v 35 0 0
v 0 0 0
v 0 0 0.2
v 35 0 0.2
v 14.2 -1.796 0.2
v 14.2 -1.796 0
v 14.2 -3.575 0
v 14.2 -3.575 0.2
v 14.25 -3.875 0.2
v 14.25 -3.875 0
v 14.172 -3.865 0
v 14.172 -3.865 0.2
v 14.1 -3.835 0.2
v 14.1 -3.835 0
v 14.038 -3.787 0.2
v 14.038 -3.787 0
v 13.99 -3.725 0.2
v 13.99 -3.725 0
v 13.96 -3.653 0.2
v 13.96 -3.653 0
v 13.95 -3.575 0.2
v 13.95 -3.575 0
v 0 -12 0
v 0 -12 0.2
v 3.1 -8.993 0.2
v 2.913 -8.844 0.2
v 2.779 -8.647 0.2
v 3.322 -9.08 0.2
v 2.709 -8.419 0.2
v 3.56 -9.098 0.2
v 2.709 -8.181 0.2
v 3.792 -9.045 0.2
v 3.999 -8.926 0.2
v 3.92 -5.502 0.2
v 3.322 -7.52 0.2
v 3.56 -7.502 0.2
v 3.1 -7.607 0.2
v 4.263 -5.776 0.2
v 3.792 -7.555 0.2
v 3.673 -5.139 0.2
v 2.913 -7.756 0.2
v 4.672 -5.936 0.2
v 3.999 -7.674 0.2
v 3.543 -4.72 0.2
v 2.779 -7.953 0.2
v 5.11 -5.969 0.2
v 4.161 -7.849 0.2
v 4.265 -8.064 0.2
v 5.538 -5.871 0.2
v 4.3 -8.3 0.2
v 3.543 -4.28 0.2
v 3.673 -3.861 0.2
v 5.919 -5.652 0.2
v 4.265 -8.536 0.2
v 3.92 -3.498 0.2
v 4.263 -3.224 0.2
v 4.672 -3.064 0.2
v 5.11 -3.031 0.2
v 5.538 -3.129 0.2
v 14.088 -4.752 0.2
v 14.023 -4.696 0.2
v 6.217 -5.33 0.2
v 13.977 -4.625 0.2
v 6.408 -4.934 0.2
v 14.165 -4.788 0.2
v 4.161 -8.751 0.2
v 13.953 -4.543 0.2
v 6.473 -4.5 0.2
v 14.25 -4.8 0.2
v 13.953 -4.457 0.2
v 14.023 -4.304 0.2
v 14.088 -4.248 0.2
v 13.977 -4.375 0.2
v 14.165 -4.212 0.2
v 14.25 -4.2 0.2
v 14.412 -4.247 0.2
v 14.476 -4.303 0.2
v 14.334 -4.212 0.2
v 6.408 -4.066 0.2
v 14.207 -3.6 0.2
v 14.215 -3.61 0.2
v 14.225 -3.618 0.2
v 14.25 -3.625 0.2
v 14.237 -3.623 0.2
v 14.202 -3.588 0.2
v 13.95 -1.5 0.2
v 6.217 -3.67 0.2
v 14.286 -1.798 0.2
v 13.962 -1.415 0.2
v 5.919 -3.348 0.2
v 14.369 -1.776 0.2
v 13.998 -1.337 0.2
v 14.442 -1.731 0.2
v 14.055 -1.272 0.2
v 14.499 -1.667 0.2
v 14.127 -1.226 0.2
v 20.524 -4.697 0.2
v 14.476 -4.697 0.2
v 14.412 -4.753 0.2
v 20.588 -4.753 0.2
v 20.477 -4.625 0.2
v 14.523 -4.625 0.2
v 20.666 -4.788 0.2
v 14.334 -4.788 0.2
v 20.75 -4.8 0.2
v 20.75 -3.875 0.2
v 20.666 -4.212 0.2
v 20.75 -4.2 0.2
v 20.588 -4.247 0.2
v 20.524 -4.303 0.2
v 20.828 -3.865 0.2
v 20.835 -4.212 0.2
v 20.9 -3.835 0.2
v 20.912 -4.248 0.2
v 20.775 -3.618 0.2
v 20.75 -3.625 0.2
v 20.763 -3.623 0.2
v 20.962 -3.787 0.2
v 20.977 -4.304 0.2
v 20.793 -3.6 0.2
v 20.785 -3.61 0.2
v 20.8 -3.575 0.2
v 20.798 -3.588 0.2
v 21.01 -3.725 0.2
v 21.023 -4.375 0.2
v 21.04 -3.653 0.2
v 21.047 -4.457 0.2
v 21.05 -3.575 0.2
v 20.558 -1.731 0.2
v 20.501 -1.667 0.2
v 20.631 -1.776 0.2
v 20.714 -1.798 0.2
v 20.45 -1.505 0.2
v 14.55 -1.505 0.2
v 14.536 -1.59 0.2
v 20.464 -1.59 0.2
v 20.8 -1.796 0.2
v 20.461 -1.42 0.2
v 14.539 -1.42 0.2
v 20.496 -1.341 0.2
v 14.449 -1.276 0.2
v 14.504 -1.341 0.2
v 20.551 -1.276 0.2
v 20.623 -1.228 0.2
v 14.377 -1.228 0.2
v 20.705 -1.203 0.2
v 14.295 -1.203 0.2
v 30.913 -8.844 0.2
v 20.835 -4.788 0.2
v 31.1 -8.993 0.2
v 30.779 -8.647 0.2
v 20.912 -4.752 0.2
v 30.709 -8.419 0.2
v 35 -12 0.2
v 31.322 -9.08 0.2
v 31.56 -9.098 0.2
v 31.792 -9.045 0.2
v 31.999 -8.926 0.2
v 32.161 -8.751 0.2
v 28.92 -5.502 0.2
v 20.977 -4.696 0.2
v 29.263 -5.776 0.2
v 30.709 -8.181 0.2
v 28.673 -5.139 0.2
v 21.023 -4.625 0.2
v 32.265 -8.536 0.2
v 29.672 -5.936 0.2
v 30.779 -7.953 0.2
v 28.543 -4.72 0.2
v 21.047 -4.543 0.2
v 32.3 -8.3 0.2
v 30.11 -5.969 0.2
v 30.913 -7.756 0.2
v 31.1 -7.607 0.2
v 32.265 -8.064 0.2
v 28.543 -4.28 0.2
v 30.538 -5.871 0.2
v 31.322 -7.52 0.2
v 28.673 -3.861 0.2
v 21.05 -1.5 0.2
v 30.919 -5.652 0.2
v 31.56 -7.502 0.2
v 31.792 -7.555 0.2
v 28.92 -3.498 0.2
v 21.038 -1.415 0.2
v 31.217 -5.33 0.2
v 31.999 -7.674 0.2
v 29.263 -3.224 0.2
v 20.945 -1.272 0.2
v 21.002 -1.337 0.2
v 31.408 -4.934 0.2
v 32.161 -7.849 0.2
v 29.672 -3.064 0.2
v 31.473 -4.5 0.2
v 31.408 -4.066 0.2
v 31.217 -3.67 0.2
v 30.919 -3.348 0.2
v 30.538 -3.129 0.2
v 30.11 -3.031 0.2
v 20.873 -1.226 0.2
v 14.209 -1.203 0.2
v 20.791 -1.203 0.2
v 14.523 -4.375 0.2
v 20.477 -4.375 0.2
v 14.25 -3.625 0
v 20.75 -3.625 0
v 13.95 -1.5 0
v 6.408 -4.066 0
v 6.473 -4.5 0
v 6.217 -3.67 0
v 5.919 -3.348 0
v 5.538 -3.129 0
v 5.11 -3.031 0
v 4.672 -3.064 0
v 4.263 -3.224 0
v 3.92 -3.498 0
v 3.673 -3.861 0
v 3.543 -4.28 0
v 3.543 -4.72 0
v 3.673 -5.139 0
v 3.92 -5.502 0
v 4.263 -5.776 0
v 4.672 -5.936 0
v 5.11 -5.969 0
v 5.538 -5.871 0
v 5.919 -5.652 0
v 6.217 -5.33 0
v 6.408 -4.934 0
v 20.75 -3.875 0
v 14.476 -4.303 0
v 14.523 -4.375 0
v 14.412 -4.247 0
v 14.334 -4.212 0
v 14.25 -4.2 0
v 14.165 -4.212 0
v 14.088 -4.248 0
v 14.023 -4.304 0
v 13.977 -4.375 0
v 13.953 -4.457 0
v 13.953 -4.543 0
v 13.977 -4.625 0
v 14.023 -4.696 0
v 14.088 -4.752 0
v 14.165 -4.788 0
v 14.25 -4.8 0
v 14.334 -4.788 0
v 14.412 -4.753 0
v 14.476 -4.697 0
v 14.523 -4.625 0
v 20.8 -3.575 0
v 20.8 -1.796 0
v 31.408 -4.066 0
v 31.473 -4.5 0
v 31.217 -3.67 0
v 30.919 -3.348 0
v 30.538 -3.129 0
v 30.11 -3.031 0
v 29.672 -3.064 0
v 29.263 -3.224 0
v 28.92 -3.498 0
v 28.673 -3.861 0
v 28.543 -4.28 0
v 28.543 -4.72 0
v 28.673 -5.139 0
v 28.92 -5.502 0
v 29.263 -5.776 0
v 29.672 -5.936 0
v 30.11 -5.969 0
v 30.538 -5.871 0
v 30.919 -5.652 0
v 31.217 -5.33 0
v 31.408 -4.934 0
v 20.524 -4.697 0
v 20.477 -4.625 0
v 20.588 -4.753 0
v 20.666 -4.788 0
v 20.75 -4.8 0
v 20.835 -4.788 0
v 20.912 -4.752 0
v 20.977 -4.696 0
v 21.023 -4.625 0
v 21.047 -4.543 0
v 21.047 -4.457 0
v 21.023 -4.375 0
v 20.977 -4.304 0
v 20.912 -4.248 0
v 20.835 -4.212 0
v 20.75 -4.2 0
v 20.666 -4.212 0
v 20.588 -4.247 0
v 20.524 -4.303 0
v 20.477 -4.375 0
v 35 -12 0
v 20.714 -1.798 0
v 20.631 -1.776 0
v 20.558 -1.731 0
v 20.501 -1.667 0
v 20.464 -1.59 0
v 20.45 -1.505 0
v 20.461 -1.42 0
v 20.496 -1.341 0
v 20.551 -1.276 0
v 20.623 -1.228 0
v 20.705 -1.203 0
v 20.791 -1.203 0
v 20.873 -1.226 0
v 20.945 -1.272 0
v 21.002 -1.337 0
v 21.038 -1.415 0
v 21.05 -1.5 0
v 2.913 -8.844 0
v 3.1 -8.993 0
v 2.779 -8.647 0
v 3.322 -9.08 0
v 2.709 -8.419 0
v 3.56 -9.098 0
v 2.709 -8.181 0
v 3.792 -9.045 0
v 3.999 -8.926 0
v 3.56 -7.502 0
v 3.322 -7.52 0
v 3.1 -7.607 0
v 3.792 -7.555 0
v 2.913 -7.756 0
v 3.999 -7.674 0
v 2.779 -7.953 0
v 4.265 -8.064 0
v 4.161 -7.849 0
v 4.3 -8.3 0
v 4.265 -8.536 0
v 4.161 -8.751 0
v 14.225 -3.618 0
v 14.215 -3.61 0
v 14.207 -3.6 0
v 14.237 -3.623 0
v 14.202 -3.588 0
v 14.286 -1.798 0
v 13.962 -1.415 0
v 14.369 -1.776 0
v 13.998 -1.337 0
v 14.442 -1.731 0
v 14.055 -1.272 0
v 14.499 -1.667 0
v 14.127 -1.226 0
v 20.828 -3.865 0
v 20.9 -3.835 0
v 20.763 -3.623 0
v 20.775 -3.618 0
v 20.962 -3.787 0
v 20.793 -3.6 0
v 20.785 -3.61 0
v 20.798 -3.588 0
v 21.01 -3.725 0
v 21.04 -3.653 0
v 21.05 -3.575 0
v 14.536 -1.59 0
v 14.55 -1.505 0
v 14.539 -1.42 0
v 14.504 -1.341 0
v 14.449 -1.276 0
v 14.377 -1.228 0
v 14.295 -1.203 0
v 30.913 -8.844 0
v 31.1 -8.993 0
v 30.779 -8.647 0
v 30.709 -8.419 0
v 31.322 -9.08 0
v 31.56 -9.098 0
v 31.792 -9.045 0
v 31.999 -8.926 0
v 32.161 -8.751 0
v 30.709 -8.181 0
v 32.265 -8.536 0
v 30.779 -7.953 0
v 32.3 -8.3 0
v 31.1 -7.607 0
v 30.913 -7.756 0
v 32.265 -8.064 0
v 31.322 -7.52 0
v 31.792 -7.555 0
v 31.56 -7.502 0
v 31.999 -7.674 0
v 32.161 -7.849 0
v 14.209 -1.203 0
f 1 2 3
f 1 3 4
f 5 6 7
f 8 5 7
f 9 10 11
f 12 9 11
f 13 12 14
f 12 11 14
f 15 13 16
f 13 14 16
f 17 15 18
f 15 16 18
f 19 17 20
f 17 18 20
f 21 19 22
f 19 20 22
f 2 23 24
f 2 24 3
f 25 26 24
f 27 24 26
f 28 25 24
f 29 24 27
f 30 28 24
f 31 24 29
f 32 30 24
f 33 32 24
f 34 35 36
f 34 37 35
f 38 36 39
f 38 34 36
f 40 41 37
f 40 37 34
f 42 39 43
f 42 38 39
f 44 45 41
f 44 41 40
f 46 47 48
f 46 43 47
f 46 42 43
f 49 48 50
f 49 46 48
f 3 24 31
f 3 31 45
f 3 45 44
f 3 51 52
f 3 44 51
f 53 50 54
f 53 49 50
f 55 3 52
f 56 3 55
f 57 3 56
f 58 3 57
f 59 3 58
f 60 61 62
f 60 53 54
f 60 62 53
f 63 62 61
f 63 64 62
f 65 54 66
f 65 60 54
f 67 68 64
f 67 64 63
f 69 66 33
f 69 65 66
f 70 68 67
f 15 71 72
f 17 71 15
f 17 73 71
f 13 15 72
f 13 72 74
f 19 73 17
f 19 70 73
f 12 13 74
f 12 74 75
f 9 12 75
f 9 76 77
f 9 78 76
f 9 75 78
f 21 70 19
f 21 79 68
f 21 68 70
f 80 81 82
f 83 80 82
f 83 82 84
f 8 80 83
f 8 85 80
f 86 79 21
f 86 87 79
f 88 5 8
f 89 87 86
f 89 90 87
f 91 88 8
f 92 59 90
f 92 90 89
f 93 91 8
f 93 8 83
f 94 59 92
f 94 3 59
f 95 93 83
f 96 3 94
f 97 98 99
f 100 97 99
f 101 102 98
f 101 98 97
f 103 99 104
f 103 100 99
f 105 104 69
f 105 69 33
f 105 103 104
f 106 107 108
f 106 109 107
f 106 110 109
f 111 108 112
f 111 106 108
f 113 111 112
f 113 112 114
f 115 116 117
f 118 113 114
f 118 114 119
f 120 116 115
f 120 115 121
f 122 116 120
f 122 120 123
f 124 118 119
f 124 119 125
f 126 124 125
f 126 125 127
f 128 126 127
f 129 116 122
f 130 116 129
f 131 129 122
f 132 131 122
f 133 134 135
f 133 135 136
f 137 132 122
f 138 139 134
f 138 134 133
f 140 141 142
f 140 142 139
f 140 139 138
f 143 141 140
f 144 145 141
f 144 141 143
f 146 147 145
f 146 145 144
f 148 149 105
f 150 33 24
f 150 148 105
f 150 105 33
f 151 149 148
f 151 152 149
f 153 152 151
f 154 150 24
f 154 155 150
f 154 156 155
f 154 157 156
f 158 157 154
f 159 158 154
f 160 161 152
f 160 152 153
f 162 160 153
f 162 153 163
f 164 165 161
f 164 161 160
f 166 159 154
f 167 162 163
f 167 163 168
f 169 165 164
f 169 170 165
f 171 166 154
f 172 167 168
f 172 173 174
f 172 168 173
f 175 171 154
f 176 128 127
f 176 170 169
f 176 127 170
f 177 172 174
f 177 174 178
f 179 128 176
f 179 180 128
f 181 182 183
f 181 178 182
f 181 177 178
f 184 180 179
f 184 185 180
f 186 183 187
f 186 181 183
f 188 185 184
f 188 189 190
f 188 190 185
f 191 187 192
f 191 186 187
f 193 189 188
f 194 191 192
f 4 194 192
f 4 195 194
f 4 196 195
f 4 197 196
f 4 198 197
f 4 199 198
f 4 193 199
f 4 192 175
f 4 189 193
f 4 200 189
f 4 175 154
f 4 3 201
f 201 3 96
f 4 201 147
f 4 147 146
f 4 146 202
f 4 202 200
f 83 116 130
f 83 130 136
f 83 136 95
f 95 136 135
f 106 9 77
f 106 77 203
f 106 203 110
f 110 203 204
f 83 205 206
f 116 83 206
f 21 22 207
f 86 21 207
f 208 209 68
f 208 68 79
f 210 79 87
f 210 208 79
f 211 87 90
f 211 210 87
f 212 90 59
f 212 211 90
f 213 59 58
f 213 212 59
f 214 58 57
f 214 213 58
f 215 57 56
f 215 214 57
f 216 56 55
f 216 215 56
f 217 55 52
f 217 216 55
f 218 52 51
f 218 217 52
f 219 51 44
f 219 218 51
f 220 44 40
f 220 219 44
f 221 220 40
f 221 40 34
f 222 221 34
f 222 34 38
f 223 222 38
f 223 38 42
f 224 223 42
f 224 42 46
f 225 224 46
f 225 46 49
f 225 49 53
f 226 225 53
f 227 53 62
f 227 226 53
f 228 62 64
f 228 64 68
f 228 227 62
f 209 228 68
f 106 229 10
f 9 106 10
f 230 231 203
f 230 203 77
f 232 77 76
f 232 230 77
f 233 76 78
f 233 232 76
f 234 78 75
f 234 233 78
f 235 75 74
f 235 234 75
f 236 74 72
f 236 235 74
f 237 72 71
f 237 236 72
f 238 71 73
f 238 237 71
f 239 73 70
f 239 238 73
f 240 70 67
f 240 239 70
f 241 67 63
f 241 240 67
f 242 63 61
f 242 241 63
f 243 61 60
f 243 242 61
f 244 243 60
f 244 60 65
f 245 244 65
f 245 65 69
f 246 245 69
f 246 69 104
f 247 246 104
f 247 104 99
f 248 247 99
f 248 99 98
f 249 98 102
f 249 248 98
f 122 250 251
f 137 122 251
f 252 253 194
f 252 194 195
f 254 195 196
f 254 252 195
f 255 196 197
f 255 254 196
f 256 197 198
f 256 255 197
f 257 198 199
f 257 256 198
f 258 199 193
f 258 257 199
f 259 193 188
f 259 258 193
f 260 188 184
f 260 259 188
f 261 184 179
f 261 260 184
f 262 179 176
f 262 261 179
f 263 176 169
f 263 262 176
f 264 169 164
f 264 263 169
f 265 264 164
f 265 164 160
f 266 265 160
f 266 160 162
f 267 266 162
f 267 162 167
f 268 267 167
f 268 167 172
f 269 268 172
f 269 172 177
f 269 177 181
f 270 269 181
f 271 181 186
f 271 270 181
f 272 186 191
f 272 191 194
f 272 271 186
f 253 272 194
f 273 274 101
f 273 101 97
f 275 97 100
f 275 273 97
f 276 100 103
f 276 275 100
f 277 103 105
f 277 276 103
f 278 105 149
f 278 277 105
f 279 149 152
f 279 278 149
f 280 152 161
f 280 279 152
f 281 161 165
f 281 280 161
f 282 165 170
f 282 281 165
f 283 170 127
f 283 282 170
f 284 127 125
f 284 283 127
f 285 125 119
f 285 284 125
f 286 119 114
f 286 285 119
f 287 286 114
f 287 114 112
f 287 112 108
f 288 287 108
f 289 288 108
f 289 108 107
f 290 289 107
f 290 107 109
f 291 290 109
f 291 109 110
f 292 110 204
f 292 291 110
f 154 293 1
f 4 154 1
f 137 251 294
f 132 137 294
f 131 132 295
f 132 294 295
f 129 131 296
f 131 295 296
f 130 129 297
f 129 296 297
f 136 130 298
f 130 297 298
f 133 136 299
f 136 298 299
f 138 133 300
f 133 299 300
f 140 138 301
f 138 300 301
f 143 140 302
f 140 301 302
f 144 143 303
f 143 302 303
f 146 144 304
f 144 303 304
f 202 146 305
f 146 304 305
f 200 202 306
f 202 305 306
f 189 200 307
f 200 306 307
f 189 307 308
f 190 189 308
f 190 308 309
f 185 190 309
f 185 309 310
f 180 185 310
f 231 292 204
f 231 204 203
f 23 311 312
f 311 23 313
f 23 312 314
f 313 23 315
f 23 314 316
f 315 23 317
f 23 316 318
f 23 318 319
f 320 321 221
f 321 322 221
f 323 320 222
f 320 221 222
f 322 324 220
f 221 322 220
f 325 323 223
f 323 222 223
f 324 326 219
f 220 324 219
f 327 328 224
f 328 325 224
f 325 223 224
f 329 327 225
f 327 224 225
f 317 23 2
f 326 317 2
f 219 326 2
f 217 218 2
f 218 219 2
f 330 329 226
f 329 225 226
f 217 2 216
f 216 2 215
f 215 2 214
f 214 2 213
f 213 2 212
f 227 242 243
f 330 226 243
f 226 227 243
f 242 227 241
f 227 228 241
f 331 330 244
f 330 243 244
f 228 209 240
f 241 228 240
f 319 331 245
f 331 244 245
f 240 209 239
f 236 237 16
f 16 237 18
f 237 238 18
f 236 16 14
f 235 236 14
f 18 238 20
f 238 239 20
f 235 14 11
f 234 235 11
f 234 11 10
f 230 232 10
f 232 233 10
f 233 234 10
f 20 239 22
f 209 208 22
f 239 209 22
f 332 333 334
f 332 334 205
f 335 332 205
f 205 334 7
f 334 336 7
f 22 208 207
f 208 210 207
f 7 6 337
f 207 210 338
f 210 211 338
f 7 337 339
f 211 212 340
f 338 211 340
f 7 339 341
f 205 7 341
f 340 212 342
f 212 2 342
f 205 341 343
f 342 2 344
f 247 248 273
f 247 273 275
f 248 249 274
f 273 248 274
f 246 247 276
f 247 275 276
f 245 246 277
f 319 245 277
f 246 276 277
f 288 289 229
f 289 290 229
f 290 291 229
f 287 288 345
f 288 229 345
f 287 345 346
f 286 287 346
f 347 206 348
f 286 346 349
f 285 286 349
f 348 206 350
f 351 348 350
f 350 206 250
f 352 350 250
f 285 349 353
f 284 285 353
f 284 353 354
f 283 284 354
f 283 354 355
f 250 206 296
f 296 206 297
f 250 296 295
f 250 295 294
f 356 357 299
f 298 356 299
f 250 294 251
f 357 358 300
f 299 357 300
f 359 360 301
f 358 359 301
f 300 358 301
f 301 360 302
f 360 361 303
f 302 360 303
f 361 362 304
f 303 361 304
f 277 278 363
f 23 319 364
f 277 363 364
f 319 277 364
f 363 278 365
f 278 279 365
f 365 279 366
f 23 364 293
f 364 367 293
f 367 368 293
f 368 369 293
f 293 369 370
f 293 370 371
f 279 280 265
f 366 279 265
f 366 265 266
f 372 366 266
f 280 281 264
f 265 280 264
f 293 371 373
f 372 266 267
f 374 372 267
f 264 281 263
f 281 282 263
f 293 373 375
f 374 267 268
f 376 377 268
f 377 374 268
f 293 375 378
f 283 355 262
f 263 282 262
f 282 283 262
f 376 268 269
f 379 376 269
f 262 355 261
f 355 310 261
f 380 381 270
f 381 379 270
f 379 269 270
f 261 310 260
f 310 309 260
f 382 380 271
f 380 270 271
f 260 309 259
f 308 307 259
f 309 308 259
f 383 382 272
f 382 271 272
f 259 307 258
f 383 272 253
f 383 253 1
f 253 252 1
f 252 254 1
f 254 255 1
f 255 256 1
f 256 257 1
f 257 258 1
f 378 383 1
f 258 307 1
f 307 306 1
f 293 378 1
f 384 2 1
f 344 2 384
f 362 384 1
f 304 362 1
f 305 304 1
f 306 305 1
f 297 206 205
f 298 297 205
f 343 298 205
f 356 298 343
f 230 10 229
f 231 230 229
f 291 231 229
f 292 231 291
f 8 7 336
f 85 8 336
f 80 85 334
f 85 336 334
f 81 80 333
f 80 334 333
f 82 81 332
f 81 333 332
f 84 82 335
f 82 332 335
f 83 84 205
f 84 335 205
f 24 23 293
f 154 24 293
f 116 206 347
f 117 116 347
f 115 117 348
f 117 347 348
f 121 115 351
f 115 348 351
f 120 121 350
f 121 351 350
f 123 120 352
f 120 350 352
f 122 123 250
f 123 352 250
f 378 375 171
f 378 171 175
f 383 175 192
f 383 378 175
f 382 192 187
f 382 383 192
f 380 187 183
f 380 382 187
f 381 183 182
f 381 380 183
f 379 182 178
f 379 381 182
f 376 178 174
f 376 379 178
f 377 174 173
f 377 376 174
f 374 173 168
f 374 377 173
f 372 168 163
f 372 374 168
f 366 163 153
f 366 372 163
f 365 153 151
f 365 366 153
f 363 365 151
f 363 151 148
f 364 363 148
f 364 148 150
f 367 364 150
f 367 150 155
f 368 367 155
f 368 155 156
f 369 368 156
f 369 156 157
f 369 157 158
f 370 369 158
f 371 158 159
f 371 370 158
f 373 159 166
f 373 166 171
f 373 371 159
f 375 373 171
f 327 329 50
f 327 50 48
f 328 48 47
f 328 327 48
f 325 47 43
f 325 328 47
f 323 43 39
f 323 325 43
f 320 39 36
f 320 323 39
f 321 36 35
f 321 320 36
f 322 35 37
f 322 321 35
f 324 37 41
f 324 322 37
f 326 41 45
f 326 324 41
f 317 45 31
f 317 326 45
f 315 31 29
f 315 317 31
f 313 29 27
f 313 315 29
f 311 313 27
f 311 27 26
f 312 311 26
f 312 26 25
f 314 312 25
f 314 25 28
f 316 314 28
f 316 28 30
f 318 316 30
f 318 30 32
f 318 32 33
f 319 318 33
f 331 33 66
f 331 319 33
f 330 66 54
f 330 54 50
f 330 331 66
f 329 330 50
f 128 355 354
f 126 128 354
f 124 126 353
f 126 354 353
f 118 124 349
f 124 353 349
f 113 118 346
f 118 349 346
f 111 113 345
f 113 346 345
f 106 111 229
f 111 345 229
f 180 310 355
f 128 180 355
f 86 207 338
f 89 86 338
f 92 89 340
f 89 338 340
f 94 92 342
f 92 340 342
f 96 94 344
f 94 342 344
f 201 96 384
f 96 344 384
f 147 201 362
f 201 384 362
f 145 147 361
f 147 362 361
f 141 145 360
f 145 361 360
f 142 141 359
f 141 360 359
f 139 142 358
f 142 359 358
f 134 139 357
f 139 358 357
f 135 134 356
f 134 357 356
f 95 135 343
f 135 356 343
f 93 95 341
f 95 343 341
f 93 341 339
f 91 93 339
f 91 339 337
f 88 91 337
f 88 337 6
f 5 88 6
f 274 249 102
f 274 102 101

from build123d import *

# Parameters (mm, degrees)
SKETCH1_W           = 35
SKETCH1_H           = 12
SKETCH1_R           = 0.8001
SKETCH1_R_2         = 1.4732
BOSS_EXTRUDE1_DEPTH = 0.2


with BuildPart() as part:
    # Sketch1 → Boss-Extrude1 (new body)
    with BuildSketch(Plane.XY):
        with Locations((17.5, -6)):
            Rectangle(SKETCH1_W, SKETCH1_H)
        with Locations((3.5, -8.3)):
            Circle(SKETCH1_R, mode=Mode.SUBTRACT)
        with Locations((5, -4.5)):
            Circle(SKETCH1_R_2, mode=Mode.SUBTRACT)
        with Locations((30, -4.5)):
            Circle(SKETCH1_R_2, mode=Mode.SUBTRACT)
        with Locations((31.5, -8.3)):
            Circle(SKETCH1_R, mode=Mode.SUBTRACT)
        with BuildLine():
            Line((14.2, -1.795803989), (14.2, -3.575))
            ThreePointArc((14.2, -3.575), (14.214644661, -3.610355339), (14.25, -3.625))
            Line((14.25, -3.625), (20.75, -3.625))
            ThreePointArc((20.75, -3.625), (20.785355339, -3.610355339), (20.8, -3.575))
            Line((20.8, -3.575), (20.8, -1.795803989))
            ThreePointArc((20.8, -1.795803989), (20.520871215, -1.306350833), (21.05, -1.5))
            Line((21.05, -1.5), (21.05, -3.575))
            ThreePointArc((21.05, -3.575), (20.962132034, -3.787132034), (20.75, -3.875))
            Line((20.75, -3.875), (14.25, -3.875))
            ThreePointArc((14.25, -3.875), (14.037867966, -3.787132034), (13.95, -3.575))
            Line((13.95, -3.575), (13.95, -1.5))
            ThreePointArc((13.95, -1.5), (14.479128785, -1.306350833), (14.2, -1.795803989))
        make_face(mode=Mode.SUBTRACT)
        with BuildLine():
            Line((20.477282197, -4.375), (14.522717803, -4.375))
            ThreePointArc((14.522717803, -4.375), (13.95, -4.5), (14.522717803, -4.625))
            Line((14.522717803, -4.625), (20.477282197, -4.625))
            ThreePointArc((20.477282197, -4.625), (21.05, -4.5), (20.477282197, -4.375))
        make_face(mode=Mode.SUBTRACT)
    extrude(amount=BOSS_EXTRUDE1_DEPTH)


solid = part.part
